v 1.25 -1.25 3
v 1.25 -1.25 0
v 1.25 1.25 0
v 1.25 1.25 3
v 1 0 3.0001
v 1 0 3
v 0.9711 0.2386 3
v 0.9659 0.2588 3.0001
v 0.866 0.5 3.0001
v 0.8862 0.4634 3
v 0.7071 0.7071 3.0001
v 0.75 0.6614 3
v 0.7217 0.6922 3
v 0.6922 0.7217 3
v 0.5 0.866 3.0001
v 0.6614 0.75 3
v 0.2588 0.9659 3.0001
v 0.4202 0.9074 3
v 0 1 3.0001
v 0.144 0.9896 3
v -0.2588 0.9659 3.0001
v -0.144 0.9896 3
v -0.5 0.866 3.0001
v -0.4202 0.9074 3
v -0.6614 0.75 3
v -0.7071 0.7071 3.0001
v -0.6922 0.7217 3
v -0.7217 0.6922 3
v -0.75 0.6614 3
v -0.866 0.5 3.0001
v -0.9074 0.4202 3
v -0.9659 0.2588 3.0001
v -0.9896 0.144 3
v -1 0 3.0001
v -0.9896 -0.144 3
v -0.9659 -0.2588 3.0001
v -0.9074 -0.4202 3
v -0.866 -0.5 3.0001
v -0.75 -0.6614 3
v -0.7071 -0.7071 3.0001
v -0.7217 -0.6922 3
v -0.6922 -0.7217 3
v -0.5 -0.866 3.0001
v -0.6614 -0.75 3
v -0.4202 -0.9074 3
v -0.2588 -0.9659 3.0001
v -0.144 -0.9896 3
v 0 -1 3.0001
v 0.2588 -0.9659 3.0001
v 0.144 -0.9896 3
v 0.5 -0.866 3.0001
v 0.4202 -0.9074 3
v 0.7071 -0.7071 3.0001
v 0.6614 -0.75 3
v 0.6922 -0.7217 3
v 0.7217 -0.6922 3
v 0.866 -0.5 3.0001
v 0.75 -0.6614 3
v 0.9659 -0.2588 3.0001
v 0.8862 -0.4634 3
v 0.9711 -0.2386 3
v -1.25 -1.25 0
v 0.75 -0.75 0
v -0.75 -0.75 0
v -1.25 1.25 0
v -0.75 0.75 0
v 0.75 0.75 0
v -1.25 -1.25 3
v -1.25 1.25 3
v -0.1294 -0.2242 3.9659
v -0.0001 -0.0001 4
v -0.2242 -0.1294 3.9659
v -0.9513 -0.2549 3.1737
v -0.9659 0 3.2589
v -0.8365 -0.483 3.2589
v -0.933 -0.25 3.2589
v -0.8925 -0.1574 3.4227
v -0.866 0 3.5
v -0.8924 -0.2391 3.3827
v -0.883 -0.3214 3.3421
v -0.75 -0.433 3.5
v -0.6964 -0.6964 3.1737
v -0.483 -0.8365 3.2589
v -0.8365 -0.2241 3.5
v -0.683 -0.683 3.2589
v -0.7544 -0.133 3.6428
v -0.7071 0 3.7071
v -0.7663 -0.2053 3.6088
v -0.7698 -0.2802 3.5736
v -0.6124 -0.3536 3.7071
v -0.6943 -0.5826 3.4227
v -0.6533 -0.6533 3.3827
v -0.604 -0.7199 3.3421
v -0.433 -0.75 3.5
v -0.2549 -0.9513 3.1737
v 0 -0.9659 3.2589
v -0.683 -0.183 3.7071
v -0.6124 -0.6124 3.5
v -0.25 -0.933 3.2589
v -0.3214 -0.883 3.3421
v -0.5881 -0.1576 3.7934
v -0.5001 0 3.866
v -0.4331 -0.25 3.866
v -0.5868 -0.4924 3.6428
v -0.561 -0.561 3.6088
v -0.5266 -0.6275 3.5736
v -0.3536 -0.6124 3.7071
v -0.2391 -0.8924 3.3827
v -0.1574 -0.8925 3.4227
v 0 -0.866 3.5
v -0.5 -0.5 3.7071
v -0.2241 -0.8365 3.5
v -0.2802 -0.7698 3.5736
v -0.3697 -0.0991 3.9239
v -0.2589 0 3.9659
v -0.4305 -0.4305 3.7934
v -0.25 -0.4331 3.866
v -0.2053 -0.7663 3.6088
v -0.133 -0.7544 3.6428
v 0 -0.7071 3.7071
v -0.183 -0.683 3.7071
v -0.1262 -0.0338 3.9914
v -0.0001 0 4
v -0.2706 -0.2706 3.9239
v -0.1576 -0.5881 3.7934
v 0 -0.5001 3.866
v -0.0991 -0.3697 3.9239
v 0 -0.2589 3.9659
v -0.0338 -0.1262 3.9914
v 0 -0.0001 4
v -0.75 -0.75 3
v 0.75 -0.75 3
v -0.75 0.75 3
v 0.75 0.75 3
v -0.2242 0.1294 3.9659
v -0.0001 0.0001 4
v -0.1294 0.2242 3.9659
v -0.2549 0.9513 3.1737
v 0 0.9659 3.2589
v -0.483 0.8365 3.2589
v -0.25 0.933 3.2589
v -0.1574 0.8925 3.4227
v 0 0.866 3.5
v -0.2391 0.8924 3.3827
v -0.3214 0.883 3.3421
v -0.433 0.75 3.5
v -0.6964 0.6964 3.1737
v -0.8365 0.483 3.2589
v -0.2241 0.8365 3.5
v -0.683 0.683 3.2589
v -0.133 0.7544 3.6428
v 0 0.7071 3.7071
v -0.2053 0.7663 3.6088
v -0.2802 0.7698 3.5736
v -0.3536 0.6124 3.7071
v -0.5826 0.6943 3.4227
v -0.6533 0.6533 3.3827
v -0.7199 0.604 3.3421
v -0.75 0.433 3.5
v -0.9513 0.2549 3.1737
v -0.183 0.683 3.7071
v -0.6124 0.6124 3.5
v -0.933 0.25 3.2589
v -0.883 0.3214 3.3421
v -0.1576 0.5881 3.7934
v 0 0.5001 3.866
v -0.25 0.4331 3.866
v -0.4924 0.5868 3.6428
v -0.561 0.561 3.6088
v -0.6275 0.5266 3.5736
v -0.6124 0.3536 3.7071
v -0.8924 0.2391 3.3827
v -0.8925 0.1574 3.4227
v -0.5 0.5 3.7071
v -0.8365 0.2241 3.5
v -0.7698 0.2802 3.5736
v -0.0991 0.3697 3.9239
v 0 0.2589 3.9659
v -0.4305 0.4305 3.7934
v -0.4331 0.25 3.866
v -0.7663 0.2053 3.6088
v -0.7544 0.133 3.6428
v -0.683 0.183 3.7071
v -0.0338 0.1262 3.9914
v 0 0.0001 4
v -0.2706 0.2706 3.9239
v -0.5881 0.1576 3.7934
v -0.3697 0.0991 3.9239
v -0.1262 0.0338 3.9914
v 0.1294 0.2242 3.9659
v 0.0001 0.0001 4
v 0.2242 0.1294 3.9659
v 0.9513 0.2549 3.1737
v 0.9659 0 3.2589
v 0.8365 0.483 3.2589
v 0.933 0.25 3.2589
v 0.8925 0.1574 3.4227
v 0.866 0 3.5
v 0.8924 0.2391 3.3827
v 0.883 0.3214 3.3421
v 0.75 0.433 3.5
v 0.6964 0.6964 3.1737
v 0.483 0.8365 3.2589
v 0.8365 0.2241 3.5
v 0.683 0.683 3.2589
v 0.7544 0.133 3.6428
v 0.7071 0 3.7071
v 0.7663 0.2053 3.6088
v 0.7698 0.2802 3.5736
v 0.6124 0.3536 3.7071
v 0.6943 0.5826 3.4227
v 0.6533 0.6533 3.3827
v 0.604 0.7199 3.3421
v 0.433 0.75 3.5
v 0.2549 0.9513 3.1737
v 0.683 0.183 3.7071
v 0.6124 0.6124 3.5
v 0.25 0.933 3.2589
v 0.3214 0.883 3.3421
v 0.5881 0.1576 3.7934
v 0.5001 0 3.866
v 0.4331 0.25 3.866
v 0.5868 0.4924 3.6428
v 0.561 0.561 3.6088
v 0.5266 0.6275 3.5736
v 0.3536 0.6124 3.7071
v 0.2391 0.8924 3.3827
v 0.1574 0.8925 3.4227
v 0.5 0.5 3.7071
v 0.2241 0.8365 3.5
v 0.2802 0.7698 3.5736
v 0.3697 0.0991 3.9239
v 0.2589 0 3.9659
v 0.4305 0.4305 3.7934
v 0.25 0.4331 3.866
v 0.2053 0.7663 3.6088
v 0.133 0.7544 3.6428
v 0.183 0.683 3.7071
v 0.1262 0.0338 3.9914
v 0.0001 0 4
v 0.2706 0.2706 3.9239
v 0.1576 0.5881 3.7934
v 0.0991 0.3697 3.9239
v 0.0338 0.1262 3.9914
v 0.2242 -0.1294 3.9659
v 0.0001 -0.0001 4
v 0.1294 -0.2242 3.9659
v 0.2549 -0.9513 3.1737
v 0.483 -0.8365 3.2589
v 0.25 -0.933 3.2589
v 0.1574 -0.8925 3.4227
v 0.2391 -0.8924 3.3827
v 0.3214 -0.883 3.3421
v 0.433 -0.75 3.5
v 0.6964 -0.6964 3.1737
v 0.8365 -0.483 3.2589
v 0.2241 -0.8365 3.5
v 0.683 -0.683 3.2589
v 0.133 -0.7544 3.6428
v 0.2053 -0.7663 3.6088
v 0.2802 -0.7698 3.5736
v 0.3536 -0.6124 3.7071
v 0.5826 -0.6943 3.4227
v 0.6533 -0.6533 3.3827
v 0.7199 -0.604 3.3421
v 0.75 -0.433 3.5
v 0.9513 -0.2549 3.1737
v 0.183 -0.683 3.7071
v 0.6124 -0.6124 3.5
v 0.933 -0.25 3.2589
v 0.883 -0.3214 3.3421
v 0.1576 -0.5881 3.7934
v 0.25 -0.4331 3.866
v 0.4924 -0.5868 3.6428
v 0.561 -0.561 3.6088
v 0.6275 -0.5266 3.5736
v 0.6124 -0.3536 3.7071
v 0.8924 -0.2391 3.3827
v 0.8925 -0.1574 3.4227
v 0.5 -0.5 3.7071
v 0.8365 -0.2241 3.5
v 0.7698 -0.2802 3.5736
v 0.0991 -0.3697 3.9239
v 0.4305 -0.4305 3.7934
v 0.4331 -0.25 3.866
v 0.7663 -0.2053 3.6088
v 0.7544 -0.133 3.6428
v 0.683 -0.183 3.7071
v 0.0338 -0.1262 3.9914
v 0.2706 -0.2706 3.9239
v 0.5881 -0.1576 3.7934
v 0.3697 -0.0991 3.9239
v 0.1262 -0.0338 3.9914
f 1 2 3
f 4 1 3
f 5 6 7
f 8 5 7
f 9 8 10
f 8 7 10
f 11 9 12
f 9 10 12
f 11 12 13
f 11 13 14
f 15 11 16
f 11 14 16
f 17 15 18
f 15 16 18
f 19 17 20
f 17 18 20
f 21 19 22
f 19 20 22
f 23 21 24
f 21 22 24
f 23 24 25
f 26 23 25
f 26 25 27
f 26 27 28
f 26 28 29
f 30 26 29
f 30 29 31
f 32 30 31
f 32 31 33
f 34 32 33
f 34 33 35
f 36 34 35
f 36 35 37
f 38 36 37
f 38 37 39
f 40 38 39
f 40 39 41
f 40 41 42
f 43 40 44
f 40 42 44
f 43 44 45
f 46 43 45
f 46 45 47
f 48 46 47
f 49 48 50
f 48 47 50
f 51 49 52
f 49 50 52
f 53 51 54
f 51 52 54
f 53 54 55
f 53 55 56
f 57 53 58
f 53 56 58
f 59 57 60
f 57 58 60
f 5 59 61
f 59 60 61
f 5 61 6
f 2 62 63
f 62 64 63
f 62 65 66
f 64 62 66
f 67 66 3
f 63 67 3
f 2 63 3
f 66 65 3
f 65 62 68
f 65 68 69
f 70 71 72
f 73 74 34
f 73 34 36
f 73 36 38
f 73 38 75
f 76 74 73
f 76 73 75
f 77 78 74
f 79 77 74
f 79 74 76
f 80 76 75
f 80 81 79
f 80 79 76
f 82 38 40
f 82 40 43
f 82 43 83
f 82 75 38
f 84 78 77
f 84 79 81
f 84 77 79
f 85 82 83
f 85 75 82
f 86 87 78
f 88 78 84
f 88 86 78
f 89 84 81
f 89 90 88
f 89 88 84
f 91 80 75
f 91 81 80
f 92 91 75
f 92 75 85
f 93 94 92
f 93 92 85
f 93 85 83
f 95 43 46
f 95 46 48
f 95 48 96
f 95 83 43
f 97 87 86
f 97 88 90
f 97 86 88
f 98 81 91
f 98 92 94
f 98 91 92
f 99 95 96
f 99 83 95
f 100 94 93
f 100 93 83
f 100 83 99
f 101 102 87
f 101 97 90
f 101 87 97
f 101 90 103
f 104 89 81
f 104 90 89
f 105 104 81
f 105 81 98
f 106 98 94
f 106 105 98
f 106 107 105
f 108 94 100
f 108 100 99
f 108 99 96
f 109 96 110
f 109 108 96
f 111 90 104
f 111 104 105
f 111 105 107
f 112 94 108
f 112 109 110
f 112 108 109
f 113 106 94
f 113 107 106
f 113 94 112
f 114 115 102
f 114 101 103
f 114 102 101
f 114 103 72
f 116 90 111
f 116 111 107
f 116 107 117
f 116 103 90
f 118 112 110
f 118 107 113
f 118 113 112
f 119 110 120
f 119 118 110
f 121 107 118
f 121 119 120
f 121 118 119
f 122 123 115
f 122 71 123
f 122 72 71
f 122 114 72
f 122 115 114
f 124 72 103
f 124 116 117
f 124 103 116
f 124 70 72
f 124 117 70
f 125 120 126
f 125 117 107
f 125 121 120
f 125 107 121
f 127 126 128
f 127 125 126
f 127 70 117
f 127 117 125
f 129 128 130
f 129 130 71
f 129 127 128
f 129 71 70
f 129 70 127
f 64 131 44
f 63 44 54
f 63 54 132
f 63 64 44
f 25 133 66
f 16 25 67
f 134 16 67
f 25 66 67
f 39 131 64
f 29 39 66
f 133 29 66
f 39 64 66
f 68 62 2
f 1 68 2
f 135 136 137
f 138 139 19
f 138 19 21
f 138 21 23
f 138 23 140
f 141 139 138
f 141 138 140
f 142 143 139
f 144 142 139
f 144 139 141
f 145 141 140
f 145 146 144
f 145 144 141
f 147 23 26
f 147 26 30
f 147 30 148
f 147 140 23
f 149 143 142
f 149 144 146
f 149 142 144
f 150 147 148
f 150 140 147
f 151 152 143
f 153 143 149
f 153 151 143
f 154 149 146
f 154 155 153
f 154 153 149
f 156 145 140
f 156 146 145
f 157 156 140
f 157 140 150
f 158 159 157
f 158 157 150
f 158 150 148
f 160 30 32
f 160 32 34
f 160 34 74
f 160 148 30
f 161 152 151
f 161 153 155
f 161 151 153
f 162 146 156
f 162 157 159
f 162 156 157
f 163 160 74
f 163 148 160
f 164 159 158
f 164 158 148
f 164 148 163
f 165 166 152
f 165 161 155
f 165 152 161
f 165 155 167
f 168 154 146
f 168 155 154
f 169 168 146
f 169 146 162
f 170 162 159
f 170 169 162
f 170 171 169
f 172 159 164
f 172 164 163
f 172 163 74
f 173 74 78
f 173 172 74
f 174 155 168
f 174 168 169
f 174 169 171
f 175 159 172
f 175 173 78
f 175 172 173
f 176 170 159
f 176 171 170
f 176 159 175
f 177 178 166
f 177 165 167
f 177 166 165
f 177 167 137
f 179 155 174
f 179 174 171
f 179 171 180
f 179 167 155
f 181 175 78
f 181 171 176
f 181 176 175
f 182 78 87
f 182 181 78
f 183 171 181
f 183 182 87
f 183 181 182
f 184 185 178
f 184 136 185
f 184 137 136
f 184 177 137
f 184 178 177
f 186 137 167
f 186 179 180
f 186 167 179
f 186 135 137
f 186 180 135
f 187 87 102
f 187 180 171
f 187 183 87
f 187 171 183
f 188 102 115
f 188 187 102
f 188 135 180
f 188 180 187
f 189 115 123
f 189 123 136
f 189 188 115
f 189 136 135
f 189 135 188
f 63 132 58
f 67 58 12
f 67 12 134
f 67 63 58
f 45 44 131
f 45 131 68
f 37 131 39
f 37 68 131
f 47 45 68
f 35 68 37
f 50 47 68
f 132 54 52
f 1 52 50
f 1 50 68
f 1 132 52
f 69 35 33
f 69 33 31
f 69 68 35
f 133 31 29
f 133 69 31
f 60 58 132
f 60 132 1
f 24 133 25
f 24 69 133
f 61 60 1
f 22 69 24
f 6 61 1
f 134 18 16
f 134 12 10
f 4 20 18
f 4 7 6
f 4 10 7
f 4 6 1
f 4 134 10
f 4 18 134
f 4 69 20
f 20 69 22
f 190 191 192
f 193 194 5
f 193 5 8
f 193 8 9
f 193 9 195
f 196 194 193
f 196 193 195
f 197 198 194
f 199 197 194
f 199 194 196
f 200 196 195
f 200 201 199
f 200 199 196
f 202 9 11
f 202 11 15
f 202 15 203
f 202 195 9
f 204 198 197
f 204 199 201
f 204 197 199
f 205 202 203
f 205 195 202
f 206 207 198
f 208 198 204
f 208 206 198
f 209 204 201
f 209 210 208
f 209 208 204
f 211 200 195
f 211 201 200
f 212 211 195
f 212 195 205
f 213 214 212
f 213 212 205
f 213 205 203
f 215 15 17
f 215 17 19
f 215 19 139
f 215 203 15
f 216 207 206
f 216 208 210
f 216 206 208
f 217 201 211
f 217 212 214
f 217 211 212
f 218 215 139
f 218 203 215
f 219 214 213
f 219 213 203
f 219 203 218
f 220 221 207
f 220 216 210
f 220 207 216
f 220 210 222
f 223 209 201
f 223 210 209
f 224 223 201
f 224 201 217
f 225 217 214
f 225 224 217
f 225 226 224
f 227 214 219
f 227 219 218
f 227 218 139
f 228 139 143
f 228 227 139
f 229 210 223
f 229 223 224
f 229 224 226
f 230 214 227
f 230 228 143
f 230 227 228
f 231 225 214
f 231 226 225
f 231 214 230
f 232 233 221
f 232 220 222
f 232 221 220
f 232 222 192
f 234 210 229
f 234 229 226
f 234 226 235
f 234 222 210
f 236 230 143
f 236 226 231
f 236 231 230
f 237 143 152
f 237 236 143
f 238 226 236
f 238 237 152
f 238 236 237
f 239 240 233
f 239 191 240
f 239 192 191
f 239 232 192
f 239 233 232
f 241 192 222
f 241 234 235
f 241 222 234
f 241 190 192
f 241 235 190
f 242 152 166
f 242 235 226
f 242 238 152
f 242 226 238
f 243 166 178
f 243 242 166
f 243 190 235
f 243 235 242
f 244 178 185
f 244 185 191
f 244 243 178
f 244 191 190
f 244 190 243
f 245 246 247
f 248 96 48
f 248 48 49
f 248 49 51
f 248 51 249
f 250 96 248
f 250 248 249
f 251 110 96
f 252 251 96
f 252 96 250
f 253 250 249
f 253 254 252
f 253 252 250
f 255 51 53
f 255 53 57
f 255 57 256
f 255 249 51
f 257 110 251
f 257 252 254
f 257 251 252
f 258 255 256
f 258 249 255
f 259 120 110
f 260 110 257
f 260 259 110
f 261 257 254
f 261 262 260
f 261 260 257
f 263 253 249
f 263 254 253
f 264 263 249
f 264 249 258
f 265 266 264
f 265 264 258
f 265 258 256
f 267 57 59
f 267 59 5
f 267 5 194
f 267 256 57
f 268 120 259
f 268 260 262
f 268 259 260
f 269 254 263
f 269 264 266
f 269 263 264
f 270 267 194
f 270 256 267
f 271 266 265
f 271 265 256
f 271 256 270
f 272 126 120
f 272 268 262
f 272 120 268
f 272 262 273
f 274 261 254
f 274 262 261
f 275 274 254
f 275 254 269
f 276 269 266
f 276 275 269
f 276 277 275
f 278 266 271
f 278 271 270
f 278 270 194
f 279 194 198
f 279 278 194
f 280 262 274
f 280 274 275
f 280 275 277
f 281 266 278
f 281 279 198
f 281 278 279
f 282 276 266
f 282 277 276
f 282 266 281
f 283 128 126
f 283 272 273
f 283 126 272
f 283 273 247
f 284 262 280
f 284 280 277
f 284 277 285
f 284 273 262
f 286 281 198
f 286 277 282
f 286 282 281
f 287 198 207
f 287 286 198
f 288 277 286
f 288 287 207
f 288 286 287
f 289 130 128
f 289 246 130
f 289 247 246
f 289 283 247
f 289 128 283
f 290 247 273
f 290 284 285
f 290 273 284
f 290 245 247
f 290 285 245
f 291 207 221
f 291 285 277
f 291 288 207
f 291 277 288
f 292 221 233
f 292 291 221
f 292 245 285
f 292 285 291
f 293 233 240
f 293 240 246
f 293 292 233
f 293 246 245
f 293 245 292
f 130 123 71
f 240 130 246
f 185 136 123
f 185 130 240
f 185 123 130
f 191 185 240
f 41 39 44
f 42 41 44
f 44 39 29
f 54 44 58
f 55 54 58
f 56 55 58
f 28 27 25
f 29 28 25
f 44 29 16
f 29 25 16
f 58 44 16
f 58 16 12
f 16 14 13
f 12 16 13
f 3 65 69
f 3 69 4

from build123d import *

# Parameters (mm, degrees)
SKETCH1_W           = 2.5
SKETCH1_H           = 2.5
SKETCH1_W_2         = 1.5
SKETCH1_H_2         = 1.5
BOSS_EXTRUDE1_DEPTH = 3
SKETCH2_W           = 2
SKETCH2_H           = 2
BOSS_EXTRUDE3_DEPTH = 1
FILLET1_R           = 1
FILLET2_R           = 1


# Some blends are built 0.0001 mm under size
with BuildPart() as part:
    # Sketch1 → Boss-Extrude1 (new body)
    with BuildSketch(Plane.XY):
        Rectangle(SKETCH1_W, SKETCH1_H)
        Rectangle(SKETCH1_W_2, SKETCH1_H_2, mode=Mode.SUBTRACT)
    extrude(amount=BOSS_EXTRUDE1_DEPTH)

    # Sketch2 → Boss-Extrude3 (add)
    with BuildSketch(Plane.XY.offset(3)):
        Rectangle(SKETCH2_W, SKETCH2_H)
    extrude(amount=BOSS_EXTRUDE3_DEPTH)

    # Fillet1
    fillet1_edges = [part.edges().sort_by_distance(p)[0] for p in [
        (0, -1, 4),
        (1, 0, 4),
        (0, 1, 4),
        (-1, 0, 4),
    ]]
    fillet(fillet1_edges, radius=FILLET1_R - 0.0001)  # a hair under: the kernel refuses the full size

    # Fillet2
    # the kernel refuses this fillet: 1 mm, written as the material it takes off along each edge
    with BuildSketch(Plane(origin=(0, 0, 4), x_dir=(1, 0, 0), z_dir=(0, -1, 0))) as fillet2_piece_1:
        with BuildLine():
            CenterArc((0.0001, -0.9999), 0.9999, 0, 90)
            Line((1, -0.9999), (1, 0))
            Line((1, 0), (0.0001, 0))
        make_face()
    revolve(axis=Axis((0, 0, 4), (0, 0, 1)), revolution_arc=90, mode=Mode.SUBTRACT)
    with BuildSketch(Plane(origin=(0, 0, 4), x_dir=(0, -1, 0), z_dir=(-1, 0, 0))) as fillet2_piece_2:
        with BuildLine():
            CenterArc((0.0001, -0.9999), 0.9999, 0, 90)
            Line((1, -0.9999), (1, 0))
            Line((1, 0), (0.0001, 0))
        make_face()
    revolve(axis=Axis((0, 0, 4), (0, 0, 1)), revolution_arc=90, mode=Mode.SUBTRACT)
    with BuildSketch(Plane(origin=(0, 0, 4), x_dir=(-1, 0, 0), z_dir=(0, 1, 0))) as fillet2_piece_3:
        with BuildLine():
            CenterArc((0.0001, -0.9999), 0.9999, 0, 90)
            Line((1, -0.9999), (1, 0))
            Line((1, 0), (0.0001, 0))
        make_face()
    revolve(axis=Axis((0, 0, 4), (0, 0, 1)), revolution_arc=90, mode=Mode.SUBTRACT)
    with BuildSketch(Plane(origin=(0, 0, 4), x_dir=(0, 1, 0), z_dir=(1, 0, 0))) as fillet2_piece_4:
        with BuildLine():
            CenterArc((0.0001, -0.9999), 0.9999, 0, 90)
            Line((1, -0.9999), (1, 0))
            Line((1, 0), (0.0001, 0))
        make_face()
    revolve(axis=Axis((0, 0, 4), (0, 0, 1)), revolution_arc=90, mode=Mode.SUBTRACT)
    with BuildSketch(Plane(origin=(-1, 1, 3), x_dir=(0, -1, 0), z_dir=(0, 0, 1)), Plane(origin=(-1, -1, 3), x_dir=(1, 0, 0), z_dir=(0, 0, 1))) as fillet2_piece_5:
        with BuildLine():
            CenterArc((FILLET2_R, FILLET2_R), FILLET2_R, 180, 90)
            Line((0, FILLET2_R), (0, 0))
            Line((0, 0), (FILLET2_R, 0))
        make_face()
    extrude(amount=1, mode=Mode.SUBTRACT)
    with BuildSketch(Plane(origin=(1, -1, 3), x_dir=(-1, 0, 0), z_dir=(0, 0, 1)), Plane(origin=(1, 1, 3), x_dir=(0, -1, 0), z_dir=(0, 0, 1))) as fillet2_piece_6:
        with BuildLine():
            CenterArc((FILLET2_R, -FILLET2_R), FILLET2_R, 90, 90)
            Line((0, -FILLET2_R), (0, 0))
            Line((0, 0), (FILLET2_R, 0))
        make_face()
    extrude(amount=1, mode=Mode.SUBTRACT)


solid = part.part
